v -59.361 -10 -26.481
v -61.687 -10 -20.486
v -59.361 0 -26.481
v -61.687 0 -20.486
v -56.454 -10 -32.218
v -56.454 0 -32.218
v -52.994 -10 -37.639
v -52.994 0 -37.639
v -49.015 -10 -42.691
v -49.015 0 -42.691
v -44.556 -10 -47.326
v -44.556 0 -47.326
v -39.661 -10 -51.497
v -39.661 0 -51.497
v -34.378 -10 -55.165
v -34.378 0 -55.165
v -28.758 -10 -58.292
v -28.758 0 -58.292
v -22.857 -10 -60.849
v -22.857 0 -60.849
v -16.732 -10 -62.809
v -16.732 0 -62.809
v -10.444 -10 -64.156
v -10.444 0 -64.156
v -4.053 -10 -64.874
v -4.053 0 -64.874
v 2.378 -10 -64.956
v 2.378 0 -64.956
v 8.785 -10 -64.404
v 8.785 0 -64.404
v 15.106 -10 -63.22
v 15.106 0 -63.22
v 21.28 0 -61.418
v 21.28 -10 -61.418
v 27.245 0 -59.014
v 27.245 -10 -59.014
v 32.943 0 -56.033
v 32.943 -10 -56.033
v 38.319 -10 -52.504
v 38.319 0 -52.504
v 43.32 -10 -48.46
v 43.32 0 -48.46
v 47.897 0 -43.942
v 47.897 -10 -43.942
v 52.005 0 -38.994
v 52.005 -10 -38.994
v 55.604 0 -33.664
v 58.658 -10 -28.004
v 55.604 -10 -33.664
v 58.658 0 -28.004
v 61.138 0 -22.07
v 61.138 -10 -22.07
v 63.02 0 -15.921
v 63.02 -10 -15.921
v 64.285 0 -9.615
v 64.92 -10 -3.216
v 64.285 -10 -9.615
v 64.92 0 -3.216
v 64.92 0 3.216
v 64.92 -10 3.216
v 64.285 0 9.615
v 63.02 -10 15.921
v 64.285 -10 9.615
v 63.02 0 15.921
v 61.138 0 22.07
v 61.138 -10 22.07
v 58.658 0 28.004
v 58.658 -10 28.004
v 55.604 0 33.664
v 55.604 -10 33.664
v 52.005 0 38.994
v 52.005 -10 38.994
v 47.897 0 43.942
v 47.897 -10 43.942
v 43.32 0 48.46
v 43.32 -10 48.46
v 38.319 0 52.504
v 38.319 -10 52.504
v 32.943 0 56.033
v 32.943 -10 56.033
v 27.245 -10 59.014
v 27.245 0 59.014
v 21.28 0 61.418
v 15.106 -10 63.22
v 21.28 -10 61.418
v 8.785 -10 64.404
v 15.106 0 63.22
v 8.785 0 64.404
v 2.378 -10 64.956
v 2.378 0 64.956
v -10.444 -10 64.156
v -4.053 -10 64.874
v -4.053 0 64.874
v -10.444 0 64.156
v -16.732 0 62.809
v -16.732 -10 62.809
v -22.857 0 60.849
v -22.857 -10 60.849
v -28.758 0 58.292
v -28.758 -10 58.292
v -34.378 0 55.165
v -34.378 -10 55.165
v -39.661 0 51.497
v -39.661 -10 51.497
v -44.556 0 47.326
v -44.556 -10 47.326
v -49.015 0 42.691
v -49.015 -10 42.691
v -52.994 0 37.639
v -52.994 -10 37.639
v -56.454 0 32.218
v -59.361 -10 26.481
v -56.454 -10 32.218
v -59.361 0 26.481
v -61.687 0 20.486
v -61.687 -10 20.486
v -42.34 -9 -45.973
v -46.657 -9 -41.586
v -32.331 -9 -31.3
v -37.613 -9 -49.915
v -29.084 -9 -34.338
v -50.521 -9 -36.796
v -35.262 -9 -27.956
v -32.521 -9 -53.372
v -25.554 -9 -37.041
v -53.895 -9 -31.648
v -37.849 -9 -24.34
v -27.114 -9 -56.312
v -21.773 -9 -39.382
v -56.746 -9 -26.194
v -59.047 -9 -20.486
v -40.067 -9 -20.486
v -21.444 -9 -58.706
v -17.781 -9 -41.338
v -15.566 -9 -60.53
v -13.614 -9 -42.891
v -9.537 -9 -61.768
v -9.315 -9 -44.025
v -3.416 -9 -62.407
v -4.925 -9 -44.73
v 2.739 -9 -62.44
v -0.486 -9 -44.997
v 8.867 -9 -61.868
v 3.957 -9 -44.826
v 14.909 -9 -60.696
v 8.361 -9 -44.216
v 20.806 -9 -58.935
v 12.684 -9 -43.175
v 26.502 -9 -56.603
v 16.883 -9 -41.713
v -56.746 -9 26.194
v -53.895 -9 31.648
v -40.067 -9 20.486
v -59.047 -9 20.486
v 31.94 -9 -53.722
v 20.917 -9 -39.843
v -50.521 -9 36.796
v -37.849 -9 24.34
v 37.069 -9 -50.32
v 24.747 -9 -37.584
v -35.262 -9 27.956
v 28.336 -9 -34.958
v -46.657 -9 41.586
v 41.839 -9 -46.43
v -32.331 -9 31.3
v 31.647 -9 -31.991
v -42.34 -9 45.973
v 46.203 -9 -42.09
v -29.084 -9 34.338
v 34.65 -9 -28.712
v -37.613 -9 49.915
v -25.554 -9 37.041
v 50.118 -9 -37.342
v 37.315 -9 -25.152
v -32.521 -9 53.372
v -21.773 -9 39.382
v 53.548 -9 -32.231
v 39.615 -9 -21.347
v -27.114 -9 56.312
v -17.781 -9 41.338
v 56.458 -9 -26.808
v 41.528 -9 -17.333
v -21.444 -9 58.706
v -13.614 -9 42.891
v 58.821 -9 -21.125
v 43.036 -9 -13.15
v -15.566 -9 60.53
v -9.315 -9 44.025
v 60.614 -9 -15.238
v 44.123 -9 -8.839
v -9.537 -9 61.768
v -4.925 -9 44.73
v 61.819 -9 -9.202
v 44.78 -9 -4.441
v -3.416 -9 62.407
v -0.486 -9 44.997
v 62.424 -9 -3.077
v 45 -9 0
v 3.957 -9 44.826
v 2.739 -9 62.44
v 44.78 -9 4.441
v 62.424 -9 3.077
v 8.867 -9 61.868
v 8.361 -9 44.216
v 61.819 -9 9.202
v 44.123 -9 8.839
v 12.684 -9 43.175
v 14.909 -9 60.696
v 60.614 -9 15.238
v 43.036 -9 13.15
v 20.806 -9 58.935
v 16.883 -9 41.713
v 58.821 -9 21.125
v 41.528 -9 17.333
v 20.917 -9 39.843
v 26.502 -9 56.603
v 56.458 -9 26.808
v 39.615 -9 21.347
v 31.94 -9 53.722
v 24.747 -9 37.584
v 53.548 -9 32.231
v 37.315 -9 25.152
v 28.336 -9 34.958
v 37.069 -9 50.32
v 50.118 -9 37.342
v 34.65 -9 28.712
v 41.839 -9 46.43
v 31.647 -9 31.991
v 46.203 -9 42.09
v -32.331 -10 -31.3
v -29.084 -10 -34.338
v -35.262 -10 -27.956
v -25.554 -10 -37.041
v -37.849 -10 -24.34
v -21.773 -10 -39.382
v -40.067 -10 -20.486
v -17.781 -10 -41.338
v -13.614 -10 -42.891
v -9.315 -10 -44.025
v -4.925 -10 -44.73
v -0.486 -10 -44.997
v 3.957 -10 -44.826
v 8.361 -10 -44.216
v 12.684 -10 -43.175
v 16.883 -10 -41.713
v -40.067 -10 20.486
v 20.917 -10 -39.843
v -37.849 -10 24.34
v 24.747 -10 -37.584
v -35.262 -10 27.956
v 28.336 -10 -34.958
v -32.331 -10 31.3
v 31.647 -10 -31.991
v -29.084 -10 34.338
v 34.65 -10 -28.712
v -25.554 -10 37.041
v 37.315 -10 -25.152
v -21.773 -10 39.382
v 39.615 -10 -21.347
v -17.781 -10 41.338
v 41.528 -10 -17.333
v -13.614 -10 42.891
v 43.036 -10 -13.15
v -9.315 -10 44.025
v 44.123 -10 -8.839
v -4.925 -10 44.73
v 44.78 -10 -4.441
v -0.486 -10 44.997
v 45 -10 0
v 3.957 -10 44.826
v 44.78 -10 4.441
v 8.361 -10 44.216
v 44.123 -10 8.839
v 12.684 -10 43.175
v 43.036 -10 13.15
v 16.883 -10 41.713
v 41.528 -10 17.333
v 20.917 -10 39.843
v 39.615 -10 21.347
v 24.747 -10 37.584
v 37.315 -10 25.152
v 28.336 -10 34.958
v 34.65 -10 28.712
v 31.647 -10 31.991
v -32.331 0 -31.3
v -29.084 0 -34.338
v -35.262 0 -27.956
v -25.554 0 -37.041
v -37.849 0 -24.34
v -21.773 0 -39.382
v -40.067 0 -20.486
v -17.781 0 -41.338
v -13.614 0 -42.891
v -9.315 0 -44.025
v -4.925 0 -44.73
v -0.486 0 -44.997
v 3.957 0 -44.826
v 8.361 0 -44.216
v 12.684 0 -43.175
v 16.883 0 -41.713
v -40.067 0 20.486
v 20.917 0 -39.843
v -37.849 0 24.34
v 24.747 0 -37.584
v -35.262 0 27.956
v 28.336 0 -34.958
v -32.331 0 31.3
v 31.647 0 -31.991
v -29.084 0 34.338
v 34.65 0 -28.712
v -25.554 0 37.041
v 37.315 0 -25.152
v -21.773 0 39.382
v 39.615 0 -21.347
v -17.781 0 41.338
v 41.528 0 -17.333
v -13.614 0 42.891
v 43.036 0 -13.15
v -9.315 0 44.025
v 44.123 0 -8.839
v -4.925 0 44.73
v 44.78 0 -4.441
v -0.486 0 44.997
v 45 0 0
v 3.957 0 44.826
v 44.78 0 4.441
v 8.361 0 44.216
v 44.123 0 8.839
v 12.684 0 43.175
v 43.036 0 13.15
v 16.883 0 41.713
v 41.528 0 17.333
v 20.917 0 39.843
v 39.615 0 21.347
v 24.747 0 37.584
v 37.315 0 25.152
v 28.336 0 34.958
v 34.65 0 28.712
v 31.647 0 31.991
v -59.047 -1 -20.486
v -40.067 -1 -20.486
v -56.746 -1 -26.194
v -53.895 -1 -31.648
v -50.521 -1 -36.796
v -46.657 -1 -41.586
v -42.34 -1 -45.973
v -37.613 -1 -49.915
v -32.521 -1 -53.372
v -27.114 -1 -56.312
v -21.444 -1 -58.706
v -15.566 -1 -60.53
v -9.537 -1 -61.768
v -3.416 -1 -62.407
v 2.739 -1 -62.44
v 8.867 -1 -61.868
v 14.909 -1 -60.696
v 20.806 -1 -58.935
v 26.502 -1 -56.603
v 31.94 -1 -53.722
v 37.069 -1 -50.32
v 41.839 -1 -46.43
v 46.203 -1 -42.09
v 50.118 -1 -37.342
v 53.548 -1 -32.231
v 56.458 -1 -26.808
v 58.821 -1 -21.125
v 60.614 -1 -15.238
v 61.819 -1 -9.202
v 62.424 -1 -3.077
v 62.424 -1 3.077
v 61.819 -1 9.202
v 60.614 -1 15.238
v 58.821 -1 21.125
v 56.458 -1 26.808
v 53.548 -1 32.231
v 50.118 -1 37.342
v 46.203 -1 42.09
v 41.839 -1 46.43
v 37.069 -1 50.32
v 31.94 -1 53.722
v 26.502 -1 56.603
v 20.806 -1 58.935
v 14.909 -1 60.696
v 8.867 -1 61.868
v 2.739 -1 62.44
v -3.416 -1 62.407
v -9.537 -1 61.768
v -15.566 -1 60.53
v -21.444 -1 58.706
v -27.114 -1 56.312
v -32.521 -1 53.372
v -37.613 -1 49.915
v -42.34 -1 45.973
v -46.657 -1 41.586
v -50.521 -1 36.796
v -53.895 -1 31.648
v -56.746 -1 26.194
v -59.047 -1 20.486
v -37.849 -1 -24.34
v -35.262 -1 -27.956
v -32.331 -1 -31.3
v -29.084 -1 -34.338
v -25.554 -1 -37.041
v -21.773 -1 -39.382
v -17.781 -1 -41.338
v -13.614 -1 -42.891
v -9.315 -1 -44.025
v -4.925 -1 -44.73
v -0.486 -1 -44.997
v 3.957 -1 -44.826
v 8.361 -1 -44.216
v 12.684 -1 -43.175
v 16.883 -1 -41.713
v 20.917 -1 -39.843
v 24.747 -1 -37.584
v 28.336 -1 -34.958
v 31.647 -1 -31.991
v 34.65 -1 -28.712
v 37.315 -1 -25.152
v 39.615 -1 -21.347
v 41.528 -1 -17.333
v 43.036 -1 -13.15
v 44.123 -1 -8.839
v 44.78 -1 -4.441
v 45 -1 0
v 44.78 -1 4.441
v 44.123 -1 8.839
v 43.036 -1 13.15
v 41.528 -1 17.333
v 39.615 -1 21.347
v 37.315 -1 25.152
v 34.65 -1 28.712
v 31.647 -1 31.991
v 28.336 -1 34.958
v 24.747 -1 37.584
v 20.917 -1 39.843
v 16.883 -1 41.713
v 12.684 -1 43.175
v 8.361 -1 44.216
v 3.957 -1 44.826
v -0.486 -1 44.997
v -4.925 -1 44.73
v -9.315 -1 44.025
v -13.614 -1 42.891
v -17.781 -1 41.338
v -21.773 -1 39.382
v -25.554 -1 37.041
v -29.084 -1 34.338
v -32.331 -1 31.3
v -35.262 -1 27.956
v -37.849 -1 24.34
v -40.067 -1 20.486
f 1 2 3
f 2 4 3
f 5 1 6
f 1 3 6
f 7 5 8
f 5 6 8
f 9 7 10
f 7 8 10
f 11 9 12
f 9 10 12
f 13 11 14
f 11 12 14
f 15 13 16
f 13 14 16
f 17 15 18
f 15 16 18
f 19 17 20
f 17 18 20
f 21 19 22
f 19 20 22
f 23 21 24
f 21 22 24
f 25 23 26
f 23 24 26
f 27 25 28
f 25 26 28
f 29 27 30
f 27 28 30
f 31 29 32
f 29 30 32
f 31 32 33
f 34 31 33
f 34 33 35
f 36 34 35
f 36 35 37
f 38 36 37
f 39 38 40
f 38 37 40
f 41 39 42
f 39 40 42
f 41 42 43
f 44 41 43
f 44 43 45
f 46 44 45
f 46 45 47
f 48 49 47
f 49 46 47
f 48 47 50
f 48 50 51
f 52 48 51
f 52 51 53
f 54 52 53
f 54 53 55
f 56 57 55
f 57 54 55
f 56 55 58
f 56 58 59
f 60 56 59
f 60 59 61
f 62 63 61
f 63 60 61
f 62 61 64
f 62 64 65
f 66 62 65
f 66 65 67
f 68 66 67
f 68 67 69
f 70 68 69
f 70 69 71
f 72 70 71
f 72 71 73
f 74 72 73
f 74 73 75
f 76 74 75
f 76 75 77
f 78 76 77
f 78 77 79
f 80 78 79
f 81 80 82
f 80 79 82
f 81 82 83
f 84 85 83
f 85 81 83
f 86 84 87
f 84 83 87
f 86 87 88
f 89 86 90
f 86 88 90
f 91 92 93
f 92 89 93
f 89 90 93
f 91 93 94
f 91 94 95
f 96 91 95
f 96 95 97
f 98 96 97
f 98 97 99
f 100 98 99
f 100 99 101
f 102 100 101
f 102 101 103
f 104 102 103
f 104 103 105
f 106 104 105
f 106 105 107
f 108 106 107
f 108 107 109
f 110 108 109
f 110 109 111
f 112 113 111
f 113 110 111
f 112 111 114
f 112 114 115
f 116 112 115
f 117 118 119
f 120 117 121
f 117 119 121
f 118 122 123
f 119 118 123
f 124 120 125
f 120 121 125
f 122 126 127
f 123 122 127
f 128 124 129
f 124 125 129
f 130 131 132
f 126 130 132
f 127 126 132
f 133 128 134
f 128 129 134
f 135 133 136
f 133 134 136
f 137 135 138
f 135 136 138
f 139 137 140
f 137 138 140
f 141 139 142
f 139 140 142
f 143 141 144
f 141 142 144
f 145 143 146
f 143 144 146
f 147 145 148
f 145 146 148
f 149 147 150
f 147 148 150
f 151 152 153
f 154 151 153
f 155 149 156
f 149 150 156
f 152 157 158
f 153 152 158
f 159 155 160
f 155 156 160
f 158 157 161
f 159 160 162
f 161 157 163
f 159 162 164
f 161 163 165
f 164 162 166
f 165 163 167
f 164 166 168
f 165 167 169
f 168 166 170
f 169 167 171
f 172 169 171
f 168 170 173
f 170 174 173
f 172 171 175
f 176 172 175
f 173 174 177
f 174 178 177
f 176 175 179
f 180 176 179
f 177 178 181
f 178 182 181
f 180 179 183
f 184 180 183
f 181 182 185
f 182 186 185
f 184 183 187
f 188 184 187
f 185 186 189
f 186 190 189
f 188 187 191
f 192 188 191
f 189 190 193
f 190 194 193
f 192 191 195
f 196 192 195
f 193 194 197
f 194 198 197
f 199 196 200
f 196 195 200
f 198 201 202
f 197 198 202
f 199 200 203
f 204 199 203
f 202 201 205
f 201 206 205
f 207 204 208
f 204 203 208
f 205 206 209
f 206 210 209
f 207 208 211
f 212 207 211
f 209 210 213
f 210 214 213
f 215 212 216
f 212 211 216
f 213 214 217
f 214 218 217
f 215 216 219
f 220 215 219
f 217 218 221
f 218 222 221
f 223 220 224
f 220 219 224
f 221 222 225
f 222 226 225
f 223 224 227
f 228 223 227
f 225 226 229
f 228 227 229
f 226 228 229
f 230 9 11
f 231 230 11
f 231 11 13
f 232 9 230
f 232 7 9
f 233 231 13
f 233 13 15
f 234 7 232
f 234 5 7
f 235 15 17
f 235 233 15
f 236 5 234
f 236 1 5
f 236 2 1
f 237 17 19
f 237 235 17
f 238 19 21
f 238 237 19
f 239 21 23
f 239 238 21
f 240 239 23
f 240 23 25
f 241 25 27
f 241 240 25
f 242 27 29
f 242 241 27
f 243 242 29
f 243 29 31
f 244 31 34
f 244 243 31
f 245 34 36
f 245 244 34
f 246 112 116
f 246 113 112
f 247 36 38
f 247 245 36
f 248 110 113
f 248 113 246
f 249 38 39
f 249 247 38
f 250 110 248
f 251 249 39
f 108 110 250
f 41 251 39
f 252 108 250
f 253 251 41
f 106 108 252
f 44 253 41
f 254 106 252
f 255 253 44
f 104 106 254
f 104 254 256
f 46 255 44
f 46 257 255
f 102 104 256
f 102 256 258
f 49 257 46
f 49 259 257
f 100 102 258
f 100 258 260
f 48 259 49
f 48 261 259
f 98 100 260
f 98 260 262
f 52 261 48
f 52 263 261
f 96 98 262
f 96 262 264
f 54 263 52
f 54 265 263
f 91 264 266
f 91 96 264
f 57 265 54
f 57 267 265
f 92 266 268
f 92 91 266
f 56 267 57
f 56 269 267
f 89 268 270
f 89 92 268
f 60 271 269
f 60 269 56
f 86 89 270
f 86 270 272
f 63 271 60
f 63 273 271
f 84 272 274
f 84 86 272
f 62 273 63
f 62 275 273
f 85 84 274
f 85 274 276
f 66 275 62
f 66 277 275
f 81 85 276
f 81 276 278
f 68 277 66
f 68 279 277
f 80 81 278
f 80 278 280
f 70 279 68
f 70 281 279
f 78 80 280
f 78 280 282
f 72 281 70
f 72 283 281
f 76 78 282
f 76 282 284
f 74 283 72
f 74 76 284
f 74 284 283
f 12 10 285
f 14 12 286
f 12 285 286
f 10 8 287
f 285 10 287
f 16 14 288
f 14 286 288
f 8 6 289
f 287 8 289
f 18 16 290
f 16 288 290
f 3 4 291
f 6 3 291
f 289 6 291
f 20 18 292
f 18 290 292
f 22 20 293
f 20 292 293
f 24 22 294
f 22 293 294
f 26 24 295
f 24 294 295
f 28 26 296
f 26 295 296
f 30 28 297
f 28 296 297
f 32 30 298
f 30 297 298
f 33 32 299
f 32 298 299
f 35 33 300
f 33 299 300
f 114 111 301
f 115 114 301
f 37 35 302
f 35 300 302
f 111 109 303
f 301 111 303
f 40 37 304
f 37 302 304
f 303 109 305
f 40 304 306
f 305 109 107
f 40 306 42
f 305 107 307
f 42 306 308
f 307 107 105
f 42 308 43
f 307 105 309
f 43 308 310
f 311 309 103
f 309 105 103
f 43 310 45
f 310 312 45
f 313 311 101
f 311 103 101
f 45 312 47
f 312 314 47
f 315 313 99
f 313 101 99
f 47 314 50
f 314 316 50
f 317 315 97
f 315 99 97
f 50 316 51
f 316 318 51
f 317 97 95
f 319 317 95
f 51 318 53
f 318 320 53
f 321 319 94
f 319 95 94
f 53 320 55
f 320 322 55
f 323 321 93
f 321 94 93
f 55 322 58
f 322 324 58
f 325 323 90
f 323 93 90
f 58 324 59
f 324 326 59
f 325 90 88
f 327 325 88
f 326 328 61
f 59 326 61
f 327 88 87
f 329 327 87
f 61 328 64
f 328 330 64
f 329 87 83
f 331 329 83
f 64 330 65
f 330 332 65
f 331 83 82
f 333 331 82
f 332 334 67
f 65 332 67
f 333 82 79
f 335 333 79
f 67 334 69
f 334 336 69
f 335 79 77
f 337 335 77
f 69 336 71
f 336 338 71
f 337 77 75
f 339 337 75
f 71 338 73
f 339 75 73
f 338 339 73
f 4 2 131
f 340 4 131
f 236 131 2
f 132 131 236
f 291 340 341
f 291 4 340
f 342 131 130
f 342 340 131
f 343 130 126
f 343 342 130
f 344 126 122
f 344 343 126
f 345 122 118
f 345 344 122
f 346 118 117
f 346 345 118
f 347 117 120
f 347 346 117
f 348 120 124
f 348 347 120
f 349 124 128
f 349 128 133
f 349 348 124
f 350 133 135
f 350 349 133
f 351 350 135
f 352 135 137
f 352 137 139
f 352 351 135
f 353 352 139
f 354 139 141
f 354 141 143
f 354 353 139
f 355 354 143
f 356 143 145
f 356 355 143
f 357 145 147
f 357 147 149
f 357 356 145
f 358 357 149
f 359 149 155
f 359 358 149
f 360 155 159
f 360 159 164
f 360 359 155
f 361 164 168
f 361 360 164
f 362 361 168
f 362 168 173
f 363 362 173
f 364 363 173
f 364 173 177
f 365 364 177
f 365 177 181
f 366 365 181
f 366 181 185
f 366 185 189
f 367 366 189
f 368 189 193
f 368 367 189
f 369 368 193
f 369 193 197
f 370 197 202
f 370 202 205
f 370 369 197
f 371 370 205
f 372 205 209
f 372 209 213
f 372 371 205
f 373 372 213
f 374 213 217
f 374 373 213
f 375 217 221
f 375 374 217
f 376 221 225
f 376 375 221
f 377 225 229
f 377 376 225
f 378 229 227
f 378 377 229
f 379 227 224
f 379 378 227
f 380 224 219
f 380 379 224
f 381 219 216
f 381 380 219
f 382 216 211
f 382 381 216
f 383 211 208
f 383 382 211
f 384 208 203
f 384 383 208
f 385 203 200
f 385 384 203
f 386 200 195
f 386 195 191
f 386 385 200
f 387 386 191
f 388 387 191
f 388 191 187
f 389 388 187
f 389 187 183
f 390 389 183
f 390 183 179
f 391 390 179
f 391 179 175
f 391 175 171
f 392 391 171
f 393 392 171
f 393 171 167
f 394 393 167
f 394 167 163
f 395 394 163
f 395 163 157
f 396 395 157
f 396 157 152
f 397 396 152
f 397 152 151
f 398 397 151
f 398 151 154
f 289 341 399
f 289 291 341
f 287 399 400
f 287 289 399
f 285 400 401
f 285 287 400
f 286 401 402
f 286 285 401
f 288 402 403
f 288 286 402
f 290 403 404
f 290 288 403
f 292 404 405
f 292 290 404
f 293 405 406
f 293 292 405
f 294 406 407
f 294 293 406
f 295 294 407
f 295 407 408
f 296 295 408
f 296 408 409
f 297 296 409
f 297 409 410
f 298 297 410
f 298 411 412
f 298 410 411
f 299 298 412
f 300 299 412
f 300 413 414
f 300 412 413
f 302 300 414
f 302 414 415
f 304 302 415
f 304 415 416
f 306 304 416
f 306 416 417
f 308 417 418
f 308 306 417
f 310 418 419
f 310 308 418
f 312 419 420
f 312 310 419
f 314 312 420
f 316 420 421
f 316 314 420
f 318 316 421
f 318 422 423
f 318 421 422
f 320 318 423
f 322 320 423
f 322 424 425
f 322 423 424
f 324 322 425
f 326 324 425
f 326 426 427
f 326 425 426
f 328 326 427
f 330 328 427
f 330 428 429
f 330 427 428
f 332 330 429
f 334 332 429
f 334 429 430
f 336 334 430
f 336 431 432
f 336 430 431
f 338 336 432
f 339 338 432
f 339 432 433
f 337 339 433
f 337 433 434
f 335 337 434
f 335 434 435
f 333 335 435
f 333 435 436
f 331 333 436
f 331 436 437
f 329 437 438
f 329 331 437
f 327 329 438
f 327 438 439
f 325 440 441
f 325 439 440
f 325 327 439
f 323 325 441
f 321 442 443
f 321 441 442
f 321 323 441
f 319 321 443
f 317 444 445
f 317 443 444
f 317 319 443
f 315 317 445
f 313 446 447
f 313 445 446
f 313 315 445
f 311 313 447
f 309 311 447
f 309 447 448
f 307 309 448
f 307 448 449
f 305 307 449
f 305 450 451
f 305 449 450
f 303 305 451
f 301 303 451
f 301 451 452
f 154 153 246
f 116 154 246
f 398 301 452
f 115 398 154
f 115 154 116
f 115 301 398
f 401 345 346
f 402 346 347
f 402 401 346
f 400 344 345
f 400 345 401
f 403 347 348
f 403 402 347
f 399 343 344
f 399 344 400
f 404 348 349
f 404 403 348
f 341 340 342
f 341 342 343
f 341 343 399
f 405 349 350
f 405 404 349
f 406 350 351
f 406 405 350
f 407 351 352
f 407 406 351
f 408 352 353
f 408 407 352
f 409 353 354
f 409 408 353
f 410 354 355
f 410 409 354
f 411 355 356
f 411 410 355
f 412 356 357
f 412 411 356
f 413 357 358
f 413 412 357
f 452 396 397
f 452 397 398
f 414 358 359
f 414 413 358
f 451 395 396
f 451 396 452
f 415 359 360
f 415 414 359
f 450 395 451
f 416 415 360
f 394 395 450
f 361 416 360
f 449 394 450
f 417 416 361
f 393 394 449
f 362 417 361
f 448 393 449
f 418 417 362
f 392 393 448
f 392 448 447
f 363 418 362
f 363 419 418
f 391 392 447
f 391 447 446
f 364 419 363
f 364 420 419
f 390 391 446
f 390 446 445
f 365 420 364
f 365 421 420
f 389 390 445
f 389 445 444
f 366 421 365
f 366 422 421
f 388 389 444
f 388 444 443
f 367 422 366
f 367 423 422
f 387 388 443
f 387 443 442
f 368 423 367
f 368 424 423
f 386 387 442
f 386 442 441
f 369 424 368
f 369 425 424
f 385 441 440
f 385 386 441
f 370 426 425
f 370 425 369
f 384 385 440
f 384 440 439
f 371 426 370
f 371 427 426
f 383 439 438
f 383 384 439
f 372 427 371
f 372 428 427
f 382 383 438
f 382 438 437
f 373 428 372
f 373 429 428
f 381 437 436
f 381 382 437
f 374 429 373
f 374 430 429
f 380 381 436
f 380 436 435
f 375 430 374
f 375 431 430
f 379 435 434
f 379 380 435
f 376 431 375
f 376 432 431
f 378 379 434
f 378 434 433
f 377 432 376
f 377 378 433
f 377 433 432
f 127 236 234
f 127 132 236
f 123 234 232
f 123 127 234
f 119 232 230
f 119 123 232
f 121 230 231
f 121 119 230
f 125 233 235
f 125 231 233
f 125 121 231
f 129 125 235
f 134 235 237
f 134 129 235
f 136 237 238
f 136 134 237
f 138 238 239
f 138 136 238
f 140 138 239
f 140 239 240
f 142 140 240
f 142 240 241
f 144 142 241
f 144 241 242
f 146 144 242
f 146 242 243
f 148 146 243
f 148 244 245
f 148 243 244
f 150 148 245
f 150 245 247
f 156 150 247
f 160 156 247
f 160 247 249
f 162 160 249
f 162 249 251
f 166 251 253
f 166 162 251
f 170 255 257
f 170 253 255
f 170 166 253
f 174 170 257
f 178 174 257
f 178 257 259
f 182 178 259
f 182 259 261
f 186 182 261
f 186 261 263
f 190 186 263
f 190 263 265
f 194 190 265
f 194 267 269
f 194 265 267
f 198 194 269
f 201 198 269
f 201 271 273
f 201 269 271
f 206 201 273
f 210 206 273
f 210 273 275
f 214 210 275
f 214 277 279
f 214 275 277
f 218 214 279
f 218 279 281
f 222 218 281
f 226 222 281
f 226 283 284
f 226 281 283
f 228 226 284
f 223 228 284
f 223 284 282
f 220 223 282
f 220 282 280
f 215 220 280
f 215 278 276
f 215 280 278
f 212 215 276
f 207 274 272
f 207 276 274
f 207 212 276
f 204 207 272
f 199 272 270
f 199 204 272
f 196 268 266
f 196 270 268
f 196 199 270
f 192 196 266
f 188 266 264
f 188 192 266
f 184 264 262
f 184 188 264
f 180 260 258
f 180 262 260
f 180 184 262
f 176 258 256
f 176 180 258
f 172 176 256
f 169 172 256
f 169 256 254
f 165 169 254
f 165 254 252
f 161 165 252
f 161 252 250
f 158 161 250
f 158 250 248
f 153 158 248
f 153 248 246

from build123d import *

# Parameters (mm, degrees)
F0_R     = 65
F1_DEPTH = 10
F3_DEPTH = 10.001
F5_R     = 62.5
F6_DEPTH = 8


with BuildPart() as f1:
    # F0 (on Front) → F1 (new body)
    with BuildSketch(Plane.XZ):
        Circle(F0_R)
    extrude(amount=F1_DEPTH)

    # F2 (on Front) → F3 (cut, through all)
    with BuildSketch(Plane.XZ):
        with BuildLine():
            Line((-104.790452, -20.48582), (-40.066584, -20.48582))
            ThreePointArc((-40.066584, -20.48582), (45, 0), (-40.066584, 20.48582))
            Line((-40.066584, 20.48582), (-167.11625, 20.48582))
            Line((-167.11625, 20.48582), (-104.790452, -20.48582))
        make_face()
    extrude(amount=F3_DEPTH, mode=Mode.SUBTRACT)

    # F5 (on offset) → F6 (cut)
    with BuildSketch(Plane.XZ.offset(1)):
        Circle(F5_R)
    extrude(amount=F6_DEPTH, mode=Mode.SUBTRACT)


solid = f1.part
